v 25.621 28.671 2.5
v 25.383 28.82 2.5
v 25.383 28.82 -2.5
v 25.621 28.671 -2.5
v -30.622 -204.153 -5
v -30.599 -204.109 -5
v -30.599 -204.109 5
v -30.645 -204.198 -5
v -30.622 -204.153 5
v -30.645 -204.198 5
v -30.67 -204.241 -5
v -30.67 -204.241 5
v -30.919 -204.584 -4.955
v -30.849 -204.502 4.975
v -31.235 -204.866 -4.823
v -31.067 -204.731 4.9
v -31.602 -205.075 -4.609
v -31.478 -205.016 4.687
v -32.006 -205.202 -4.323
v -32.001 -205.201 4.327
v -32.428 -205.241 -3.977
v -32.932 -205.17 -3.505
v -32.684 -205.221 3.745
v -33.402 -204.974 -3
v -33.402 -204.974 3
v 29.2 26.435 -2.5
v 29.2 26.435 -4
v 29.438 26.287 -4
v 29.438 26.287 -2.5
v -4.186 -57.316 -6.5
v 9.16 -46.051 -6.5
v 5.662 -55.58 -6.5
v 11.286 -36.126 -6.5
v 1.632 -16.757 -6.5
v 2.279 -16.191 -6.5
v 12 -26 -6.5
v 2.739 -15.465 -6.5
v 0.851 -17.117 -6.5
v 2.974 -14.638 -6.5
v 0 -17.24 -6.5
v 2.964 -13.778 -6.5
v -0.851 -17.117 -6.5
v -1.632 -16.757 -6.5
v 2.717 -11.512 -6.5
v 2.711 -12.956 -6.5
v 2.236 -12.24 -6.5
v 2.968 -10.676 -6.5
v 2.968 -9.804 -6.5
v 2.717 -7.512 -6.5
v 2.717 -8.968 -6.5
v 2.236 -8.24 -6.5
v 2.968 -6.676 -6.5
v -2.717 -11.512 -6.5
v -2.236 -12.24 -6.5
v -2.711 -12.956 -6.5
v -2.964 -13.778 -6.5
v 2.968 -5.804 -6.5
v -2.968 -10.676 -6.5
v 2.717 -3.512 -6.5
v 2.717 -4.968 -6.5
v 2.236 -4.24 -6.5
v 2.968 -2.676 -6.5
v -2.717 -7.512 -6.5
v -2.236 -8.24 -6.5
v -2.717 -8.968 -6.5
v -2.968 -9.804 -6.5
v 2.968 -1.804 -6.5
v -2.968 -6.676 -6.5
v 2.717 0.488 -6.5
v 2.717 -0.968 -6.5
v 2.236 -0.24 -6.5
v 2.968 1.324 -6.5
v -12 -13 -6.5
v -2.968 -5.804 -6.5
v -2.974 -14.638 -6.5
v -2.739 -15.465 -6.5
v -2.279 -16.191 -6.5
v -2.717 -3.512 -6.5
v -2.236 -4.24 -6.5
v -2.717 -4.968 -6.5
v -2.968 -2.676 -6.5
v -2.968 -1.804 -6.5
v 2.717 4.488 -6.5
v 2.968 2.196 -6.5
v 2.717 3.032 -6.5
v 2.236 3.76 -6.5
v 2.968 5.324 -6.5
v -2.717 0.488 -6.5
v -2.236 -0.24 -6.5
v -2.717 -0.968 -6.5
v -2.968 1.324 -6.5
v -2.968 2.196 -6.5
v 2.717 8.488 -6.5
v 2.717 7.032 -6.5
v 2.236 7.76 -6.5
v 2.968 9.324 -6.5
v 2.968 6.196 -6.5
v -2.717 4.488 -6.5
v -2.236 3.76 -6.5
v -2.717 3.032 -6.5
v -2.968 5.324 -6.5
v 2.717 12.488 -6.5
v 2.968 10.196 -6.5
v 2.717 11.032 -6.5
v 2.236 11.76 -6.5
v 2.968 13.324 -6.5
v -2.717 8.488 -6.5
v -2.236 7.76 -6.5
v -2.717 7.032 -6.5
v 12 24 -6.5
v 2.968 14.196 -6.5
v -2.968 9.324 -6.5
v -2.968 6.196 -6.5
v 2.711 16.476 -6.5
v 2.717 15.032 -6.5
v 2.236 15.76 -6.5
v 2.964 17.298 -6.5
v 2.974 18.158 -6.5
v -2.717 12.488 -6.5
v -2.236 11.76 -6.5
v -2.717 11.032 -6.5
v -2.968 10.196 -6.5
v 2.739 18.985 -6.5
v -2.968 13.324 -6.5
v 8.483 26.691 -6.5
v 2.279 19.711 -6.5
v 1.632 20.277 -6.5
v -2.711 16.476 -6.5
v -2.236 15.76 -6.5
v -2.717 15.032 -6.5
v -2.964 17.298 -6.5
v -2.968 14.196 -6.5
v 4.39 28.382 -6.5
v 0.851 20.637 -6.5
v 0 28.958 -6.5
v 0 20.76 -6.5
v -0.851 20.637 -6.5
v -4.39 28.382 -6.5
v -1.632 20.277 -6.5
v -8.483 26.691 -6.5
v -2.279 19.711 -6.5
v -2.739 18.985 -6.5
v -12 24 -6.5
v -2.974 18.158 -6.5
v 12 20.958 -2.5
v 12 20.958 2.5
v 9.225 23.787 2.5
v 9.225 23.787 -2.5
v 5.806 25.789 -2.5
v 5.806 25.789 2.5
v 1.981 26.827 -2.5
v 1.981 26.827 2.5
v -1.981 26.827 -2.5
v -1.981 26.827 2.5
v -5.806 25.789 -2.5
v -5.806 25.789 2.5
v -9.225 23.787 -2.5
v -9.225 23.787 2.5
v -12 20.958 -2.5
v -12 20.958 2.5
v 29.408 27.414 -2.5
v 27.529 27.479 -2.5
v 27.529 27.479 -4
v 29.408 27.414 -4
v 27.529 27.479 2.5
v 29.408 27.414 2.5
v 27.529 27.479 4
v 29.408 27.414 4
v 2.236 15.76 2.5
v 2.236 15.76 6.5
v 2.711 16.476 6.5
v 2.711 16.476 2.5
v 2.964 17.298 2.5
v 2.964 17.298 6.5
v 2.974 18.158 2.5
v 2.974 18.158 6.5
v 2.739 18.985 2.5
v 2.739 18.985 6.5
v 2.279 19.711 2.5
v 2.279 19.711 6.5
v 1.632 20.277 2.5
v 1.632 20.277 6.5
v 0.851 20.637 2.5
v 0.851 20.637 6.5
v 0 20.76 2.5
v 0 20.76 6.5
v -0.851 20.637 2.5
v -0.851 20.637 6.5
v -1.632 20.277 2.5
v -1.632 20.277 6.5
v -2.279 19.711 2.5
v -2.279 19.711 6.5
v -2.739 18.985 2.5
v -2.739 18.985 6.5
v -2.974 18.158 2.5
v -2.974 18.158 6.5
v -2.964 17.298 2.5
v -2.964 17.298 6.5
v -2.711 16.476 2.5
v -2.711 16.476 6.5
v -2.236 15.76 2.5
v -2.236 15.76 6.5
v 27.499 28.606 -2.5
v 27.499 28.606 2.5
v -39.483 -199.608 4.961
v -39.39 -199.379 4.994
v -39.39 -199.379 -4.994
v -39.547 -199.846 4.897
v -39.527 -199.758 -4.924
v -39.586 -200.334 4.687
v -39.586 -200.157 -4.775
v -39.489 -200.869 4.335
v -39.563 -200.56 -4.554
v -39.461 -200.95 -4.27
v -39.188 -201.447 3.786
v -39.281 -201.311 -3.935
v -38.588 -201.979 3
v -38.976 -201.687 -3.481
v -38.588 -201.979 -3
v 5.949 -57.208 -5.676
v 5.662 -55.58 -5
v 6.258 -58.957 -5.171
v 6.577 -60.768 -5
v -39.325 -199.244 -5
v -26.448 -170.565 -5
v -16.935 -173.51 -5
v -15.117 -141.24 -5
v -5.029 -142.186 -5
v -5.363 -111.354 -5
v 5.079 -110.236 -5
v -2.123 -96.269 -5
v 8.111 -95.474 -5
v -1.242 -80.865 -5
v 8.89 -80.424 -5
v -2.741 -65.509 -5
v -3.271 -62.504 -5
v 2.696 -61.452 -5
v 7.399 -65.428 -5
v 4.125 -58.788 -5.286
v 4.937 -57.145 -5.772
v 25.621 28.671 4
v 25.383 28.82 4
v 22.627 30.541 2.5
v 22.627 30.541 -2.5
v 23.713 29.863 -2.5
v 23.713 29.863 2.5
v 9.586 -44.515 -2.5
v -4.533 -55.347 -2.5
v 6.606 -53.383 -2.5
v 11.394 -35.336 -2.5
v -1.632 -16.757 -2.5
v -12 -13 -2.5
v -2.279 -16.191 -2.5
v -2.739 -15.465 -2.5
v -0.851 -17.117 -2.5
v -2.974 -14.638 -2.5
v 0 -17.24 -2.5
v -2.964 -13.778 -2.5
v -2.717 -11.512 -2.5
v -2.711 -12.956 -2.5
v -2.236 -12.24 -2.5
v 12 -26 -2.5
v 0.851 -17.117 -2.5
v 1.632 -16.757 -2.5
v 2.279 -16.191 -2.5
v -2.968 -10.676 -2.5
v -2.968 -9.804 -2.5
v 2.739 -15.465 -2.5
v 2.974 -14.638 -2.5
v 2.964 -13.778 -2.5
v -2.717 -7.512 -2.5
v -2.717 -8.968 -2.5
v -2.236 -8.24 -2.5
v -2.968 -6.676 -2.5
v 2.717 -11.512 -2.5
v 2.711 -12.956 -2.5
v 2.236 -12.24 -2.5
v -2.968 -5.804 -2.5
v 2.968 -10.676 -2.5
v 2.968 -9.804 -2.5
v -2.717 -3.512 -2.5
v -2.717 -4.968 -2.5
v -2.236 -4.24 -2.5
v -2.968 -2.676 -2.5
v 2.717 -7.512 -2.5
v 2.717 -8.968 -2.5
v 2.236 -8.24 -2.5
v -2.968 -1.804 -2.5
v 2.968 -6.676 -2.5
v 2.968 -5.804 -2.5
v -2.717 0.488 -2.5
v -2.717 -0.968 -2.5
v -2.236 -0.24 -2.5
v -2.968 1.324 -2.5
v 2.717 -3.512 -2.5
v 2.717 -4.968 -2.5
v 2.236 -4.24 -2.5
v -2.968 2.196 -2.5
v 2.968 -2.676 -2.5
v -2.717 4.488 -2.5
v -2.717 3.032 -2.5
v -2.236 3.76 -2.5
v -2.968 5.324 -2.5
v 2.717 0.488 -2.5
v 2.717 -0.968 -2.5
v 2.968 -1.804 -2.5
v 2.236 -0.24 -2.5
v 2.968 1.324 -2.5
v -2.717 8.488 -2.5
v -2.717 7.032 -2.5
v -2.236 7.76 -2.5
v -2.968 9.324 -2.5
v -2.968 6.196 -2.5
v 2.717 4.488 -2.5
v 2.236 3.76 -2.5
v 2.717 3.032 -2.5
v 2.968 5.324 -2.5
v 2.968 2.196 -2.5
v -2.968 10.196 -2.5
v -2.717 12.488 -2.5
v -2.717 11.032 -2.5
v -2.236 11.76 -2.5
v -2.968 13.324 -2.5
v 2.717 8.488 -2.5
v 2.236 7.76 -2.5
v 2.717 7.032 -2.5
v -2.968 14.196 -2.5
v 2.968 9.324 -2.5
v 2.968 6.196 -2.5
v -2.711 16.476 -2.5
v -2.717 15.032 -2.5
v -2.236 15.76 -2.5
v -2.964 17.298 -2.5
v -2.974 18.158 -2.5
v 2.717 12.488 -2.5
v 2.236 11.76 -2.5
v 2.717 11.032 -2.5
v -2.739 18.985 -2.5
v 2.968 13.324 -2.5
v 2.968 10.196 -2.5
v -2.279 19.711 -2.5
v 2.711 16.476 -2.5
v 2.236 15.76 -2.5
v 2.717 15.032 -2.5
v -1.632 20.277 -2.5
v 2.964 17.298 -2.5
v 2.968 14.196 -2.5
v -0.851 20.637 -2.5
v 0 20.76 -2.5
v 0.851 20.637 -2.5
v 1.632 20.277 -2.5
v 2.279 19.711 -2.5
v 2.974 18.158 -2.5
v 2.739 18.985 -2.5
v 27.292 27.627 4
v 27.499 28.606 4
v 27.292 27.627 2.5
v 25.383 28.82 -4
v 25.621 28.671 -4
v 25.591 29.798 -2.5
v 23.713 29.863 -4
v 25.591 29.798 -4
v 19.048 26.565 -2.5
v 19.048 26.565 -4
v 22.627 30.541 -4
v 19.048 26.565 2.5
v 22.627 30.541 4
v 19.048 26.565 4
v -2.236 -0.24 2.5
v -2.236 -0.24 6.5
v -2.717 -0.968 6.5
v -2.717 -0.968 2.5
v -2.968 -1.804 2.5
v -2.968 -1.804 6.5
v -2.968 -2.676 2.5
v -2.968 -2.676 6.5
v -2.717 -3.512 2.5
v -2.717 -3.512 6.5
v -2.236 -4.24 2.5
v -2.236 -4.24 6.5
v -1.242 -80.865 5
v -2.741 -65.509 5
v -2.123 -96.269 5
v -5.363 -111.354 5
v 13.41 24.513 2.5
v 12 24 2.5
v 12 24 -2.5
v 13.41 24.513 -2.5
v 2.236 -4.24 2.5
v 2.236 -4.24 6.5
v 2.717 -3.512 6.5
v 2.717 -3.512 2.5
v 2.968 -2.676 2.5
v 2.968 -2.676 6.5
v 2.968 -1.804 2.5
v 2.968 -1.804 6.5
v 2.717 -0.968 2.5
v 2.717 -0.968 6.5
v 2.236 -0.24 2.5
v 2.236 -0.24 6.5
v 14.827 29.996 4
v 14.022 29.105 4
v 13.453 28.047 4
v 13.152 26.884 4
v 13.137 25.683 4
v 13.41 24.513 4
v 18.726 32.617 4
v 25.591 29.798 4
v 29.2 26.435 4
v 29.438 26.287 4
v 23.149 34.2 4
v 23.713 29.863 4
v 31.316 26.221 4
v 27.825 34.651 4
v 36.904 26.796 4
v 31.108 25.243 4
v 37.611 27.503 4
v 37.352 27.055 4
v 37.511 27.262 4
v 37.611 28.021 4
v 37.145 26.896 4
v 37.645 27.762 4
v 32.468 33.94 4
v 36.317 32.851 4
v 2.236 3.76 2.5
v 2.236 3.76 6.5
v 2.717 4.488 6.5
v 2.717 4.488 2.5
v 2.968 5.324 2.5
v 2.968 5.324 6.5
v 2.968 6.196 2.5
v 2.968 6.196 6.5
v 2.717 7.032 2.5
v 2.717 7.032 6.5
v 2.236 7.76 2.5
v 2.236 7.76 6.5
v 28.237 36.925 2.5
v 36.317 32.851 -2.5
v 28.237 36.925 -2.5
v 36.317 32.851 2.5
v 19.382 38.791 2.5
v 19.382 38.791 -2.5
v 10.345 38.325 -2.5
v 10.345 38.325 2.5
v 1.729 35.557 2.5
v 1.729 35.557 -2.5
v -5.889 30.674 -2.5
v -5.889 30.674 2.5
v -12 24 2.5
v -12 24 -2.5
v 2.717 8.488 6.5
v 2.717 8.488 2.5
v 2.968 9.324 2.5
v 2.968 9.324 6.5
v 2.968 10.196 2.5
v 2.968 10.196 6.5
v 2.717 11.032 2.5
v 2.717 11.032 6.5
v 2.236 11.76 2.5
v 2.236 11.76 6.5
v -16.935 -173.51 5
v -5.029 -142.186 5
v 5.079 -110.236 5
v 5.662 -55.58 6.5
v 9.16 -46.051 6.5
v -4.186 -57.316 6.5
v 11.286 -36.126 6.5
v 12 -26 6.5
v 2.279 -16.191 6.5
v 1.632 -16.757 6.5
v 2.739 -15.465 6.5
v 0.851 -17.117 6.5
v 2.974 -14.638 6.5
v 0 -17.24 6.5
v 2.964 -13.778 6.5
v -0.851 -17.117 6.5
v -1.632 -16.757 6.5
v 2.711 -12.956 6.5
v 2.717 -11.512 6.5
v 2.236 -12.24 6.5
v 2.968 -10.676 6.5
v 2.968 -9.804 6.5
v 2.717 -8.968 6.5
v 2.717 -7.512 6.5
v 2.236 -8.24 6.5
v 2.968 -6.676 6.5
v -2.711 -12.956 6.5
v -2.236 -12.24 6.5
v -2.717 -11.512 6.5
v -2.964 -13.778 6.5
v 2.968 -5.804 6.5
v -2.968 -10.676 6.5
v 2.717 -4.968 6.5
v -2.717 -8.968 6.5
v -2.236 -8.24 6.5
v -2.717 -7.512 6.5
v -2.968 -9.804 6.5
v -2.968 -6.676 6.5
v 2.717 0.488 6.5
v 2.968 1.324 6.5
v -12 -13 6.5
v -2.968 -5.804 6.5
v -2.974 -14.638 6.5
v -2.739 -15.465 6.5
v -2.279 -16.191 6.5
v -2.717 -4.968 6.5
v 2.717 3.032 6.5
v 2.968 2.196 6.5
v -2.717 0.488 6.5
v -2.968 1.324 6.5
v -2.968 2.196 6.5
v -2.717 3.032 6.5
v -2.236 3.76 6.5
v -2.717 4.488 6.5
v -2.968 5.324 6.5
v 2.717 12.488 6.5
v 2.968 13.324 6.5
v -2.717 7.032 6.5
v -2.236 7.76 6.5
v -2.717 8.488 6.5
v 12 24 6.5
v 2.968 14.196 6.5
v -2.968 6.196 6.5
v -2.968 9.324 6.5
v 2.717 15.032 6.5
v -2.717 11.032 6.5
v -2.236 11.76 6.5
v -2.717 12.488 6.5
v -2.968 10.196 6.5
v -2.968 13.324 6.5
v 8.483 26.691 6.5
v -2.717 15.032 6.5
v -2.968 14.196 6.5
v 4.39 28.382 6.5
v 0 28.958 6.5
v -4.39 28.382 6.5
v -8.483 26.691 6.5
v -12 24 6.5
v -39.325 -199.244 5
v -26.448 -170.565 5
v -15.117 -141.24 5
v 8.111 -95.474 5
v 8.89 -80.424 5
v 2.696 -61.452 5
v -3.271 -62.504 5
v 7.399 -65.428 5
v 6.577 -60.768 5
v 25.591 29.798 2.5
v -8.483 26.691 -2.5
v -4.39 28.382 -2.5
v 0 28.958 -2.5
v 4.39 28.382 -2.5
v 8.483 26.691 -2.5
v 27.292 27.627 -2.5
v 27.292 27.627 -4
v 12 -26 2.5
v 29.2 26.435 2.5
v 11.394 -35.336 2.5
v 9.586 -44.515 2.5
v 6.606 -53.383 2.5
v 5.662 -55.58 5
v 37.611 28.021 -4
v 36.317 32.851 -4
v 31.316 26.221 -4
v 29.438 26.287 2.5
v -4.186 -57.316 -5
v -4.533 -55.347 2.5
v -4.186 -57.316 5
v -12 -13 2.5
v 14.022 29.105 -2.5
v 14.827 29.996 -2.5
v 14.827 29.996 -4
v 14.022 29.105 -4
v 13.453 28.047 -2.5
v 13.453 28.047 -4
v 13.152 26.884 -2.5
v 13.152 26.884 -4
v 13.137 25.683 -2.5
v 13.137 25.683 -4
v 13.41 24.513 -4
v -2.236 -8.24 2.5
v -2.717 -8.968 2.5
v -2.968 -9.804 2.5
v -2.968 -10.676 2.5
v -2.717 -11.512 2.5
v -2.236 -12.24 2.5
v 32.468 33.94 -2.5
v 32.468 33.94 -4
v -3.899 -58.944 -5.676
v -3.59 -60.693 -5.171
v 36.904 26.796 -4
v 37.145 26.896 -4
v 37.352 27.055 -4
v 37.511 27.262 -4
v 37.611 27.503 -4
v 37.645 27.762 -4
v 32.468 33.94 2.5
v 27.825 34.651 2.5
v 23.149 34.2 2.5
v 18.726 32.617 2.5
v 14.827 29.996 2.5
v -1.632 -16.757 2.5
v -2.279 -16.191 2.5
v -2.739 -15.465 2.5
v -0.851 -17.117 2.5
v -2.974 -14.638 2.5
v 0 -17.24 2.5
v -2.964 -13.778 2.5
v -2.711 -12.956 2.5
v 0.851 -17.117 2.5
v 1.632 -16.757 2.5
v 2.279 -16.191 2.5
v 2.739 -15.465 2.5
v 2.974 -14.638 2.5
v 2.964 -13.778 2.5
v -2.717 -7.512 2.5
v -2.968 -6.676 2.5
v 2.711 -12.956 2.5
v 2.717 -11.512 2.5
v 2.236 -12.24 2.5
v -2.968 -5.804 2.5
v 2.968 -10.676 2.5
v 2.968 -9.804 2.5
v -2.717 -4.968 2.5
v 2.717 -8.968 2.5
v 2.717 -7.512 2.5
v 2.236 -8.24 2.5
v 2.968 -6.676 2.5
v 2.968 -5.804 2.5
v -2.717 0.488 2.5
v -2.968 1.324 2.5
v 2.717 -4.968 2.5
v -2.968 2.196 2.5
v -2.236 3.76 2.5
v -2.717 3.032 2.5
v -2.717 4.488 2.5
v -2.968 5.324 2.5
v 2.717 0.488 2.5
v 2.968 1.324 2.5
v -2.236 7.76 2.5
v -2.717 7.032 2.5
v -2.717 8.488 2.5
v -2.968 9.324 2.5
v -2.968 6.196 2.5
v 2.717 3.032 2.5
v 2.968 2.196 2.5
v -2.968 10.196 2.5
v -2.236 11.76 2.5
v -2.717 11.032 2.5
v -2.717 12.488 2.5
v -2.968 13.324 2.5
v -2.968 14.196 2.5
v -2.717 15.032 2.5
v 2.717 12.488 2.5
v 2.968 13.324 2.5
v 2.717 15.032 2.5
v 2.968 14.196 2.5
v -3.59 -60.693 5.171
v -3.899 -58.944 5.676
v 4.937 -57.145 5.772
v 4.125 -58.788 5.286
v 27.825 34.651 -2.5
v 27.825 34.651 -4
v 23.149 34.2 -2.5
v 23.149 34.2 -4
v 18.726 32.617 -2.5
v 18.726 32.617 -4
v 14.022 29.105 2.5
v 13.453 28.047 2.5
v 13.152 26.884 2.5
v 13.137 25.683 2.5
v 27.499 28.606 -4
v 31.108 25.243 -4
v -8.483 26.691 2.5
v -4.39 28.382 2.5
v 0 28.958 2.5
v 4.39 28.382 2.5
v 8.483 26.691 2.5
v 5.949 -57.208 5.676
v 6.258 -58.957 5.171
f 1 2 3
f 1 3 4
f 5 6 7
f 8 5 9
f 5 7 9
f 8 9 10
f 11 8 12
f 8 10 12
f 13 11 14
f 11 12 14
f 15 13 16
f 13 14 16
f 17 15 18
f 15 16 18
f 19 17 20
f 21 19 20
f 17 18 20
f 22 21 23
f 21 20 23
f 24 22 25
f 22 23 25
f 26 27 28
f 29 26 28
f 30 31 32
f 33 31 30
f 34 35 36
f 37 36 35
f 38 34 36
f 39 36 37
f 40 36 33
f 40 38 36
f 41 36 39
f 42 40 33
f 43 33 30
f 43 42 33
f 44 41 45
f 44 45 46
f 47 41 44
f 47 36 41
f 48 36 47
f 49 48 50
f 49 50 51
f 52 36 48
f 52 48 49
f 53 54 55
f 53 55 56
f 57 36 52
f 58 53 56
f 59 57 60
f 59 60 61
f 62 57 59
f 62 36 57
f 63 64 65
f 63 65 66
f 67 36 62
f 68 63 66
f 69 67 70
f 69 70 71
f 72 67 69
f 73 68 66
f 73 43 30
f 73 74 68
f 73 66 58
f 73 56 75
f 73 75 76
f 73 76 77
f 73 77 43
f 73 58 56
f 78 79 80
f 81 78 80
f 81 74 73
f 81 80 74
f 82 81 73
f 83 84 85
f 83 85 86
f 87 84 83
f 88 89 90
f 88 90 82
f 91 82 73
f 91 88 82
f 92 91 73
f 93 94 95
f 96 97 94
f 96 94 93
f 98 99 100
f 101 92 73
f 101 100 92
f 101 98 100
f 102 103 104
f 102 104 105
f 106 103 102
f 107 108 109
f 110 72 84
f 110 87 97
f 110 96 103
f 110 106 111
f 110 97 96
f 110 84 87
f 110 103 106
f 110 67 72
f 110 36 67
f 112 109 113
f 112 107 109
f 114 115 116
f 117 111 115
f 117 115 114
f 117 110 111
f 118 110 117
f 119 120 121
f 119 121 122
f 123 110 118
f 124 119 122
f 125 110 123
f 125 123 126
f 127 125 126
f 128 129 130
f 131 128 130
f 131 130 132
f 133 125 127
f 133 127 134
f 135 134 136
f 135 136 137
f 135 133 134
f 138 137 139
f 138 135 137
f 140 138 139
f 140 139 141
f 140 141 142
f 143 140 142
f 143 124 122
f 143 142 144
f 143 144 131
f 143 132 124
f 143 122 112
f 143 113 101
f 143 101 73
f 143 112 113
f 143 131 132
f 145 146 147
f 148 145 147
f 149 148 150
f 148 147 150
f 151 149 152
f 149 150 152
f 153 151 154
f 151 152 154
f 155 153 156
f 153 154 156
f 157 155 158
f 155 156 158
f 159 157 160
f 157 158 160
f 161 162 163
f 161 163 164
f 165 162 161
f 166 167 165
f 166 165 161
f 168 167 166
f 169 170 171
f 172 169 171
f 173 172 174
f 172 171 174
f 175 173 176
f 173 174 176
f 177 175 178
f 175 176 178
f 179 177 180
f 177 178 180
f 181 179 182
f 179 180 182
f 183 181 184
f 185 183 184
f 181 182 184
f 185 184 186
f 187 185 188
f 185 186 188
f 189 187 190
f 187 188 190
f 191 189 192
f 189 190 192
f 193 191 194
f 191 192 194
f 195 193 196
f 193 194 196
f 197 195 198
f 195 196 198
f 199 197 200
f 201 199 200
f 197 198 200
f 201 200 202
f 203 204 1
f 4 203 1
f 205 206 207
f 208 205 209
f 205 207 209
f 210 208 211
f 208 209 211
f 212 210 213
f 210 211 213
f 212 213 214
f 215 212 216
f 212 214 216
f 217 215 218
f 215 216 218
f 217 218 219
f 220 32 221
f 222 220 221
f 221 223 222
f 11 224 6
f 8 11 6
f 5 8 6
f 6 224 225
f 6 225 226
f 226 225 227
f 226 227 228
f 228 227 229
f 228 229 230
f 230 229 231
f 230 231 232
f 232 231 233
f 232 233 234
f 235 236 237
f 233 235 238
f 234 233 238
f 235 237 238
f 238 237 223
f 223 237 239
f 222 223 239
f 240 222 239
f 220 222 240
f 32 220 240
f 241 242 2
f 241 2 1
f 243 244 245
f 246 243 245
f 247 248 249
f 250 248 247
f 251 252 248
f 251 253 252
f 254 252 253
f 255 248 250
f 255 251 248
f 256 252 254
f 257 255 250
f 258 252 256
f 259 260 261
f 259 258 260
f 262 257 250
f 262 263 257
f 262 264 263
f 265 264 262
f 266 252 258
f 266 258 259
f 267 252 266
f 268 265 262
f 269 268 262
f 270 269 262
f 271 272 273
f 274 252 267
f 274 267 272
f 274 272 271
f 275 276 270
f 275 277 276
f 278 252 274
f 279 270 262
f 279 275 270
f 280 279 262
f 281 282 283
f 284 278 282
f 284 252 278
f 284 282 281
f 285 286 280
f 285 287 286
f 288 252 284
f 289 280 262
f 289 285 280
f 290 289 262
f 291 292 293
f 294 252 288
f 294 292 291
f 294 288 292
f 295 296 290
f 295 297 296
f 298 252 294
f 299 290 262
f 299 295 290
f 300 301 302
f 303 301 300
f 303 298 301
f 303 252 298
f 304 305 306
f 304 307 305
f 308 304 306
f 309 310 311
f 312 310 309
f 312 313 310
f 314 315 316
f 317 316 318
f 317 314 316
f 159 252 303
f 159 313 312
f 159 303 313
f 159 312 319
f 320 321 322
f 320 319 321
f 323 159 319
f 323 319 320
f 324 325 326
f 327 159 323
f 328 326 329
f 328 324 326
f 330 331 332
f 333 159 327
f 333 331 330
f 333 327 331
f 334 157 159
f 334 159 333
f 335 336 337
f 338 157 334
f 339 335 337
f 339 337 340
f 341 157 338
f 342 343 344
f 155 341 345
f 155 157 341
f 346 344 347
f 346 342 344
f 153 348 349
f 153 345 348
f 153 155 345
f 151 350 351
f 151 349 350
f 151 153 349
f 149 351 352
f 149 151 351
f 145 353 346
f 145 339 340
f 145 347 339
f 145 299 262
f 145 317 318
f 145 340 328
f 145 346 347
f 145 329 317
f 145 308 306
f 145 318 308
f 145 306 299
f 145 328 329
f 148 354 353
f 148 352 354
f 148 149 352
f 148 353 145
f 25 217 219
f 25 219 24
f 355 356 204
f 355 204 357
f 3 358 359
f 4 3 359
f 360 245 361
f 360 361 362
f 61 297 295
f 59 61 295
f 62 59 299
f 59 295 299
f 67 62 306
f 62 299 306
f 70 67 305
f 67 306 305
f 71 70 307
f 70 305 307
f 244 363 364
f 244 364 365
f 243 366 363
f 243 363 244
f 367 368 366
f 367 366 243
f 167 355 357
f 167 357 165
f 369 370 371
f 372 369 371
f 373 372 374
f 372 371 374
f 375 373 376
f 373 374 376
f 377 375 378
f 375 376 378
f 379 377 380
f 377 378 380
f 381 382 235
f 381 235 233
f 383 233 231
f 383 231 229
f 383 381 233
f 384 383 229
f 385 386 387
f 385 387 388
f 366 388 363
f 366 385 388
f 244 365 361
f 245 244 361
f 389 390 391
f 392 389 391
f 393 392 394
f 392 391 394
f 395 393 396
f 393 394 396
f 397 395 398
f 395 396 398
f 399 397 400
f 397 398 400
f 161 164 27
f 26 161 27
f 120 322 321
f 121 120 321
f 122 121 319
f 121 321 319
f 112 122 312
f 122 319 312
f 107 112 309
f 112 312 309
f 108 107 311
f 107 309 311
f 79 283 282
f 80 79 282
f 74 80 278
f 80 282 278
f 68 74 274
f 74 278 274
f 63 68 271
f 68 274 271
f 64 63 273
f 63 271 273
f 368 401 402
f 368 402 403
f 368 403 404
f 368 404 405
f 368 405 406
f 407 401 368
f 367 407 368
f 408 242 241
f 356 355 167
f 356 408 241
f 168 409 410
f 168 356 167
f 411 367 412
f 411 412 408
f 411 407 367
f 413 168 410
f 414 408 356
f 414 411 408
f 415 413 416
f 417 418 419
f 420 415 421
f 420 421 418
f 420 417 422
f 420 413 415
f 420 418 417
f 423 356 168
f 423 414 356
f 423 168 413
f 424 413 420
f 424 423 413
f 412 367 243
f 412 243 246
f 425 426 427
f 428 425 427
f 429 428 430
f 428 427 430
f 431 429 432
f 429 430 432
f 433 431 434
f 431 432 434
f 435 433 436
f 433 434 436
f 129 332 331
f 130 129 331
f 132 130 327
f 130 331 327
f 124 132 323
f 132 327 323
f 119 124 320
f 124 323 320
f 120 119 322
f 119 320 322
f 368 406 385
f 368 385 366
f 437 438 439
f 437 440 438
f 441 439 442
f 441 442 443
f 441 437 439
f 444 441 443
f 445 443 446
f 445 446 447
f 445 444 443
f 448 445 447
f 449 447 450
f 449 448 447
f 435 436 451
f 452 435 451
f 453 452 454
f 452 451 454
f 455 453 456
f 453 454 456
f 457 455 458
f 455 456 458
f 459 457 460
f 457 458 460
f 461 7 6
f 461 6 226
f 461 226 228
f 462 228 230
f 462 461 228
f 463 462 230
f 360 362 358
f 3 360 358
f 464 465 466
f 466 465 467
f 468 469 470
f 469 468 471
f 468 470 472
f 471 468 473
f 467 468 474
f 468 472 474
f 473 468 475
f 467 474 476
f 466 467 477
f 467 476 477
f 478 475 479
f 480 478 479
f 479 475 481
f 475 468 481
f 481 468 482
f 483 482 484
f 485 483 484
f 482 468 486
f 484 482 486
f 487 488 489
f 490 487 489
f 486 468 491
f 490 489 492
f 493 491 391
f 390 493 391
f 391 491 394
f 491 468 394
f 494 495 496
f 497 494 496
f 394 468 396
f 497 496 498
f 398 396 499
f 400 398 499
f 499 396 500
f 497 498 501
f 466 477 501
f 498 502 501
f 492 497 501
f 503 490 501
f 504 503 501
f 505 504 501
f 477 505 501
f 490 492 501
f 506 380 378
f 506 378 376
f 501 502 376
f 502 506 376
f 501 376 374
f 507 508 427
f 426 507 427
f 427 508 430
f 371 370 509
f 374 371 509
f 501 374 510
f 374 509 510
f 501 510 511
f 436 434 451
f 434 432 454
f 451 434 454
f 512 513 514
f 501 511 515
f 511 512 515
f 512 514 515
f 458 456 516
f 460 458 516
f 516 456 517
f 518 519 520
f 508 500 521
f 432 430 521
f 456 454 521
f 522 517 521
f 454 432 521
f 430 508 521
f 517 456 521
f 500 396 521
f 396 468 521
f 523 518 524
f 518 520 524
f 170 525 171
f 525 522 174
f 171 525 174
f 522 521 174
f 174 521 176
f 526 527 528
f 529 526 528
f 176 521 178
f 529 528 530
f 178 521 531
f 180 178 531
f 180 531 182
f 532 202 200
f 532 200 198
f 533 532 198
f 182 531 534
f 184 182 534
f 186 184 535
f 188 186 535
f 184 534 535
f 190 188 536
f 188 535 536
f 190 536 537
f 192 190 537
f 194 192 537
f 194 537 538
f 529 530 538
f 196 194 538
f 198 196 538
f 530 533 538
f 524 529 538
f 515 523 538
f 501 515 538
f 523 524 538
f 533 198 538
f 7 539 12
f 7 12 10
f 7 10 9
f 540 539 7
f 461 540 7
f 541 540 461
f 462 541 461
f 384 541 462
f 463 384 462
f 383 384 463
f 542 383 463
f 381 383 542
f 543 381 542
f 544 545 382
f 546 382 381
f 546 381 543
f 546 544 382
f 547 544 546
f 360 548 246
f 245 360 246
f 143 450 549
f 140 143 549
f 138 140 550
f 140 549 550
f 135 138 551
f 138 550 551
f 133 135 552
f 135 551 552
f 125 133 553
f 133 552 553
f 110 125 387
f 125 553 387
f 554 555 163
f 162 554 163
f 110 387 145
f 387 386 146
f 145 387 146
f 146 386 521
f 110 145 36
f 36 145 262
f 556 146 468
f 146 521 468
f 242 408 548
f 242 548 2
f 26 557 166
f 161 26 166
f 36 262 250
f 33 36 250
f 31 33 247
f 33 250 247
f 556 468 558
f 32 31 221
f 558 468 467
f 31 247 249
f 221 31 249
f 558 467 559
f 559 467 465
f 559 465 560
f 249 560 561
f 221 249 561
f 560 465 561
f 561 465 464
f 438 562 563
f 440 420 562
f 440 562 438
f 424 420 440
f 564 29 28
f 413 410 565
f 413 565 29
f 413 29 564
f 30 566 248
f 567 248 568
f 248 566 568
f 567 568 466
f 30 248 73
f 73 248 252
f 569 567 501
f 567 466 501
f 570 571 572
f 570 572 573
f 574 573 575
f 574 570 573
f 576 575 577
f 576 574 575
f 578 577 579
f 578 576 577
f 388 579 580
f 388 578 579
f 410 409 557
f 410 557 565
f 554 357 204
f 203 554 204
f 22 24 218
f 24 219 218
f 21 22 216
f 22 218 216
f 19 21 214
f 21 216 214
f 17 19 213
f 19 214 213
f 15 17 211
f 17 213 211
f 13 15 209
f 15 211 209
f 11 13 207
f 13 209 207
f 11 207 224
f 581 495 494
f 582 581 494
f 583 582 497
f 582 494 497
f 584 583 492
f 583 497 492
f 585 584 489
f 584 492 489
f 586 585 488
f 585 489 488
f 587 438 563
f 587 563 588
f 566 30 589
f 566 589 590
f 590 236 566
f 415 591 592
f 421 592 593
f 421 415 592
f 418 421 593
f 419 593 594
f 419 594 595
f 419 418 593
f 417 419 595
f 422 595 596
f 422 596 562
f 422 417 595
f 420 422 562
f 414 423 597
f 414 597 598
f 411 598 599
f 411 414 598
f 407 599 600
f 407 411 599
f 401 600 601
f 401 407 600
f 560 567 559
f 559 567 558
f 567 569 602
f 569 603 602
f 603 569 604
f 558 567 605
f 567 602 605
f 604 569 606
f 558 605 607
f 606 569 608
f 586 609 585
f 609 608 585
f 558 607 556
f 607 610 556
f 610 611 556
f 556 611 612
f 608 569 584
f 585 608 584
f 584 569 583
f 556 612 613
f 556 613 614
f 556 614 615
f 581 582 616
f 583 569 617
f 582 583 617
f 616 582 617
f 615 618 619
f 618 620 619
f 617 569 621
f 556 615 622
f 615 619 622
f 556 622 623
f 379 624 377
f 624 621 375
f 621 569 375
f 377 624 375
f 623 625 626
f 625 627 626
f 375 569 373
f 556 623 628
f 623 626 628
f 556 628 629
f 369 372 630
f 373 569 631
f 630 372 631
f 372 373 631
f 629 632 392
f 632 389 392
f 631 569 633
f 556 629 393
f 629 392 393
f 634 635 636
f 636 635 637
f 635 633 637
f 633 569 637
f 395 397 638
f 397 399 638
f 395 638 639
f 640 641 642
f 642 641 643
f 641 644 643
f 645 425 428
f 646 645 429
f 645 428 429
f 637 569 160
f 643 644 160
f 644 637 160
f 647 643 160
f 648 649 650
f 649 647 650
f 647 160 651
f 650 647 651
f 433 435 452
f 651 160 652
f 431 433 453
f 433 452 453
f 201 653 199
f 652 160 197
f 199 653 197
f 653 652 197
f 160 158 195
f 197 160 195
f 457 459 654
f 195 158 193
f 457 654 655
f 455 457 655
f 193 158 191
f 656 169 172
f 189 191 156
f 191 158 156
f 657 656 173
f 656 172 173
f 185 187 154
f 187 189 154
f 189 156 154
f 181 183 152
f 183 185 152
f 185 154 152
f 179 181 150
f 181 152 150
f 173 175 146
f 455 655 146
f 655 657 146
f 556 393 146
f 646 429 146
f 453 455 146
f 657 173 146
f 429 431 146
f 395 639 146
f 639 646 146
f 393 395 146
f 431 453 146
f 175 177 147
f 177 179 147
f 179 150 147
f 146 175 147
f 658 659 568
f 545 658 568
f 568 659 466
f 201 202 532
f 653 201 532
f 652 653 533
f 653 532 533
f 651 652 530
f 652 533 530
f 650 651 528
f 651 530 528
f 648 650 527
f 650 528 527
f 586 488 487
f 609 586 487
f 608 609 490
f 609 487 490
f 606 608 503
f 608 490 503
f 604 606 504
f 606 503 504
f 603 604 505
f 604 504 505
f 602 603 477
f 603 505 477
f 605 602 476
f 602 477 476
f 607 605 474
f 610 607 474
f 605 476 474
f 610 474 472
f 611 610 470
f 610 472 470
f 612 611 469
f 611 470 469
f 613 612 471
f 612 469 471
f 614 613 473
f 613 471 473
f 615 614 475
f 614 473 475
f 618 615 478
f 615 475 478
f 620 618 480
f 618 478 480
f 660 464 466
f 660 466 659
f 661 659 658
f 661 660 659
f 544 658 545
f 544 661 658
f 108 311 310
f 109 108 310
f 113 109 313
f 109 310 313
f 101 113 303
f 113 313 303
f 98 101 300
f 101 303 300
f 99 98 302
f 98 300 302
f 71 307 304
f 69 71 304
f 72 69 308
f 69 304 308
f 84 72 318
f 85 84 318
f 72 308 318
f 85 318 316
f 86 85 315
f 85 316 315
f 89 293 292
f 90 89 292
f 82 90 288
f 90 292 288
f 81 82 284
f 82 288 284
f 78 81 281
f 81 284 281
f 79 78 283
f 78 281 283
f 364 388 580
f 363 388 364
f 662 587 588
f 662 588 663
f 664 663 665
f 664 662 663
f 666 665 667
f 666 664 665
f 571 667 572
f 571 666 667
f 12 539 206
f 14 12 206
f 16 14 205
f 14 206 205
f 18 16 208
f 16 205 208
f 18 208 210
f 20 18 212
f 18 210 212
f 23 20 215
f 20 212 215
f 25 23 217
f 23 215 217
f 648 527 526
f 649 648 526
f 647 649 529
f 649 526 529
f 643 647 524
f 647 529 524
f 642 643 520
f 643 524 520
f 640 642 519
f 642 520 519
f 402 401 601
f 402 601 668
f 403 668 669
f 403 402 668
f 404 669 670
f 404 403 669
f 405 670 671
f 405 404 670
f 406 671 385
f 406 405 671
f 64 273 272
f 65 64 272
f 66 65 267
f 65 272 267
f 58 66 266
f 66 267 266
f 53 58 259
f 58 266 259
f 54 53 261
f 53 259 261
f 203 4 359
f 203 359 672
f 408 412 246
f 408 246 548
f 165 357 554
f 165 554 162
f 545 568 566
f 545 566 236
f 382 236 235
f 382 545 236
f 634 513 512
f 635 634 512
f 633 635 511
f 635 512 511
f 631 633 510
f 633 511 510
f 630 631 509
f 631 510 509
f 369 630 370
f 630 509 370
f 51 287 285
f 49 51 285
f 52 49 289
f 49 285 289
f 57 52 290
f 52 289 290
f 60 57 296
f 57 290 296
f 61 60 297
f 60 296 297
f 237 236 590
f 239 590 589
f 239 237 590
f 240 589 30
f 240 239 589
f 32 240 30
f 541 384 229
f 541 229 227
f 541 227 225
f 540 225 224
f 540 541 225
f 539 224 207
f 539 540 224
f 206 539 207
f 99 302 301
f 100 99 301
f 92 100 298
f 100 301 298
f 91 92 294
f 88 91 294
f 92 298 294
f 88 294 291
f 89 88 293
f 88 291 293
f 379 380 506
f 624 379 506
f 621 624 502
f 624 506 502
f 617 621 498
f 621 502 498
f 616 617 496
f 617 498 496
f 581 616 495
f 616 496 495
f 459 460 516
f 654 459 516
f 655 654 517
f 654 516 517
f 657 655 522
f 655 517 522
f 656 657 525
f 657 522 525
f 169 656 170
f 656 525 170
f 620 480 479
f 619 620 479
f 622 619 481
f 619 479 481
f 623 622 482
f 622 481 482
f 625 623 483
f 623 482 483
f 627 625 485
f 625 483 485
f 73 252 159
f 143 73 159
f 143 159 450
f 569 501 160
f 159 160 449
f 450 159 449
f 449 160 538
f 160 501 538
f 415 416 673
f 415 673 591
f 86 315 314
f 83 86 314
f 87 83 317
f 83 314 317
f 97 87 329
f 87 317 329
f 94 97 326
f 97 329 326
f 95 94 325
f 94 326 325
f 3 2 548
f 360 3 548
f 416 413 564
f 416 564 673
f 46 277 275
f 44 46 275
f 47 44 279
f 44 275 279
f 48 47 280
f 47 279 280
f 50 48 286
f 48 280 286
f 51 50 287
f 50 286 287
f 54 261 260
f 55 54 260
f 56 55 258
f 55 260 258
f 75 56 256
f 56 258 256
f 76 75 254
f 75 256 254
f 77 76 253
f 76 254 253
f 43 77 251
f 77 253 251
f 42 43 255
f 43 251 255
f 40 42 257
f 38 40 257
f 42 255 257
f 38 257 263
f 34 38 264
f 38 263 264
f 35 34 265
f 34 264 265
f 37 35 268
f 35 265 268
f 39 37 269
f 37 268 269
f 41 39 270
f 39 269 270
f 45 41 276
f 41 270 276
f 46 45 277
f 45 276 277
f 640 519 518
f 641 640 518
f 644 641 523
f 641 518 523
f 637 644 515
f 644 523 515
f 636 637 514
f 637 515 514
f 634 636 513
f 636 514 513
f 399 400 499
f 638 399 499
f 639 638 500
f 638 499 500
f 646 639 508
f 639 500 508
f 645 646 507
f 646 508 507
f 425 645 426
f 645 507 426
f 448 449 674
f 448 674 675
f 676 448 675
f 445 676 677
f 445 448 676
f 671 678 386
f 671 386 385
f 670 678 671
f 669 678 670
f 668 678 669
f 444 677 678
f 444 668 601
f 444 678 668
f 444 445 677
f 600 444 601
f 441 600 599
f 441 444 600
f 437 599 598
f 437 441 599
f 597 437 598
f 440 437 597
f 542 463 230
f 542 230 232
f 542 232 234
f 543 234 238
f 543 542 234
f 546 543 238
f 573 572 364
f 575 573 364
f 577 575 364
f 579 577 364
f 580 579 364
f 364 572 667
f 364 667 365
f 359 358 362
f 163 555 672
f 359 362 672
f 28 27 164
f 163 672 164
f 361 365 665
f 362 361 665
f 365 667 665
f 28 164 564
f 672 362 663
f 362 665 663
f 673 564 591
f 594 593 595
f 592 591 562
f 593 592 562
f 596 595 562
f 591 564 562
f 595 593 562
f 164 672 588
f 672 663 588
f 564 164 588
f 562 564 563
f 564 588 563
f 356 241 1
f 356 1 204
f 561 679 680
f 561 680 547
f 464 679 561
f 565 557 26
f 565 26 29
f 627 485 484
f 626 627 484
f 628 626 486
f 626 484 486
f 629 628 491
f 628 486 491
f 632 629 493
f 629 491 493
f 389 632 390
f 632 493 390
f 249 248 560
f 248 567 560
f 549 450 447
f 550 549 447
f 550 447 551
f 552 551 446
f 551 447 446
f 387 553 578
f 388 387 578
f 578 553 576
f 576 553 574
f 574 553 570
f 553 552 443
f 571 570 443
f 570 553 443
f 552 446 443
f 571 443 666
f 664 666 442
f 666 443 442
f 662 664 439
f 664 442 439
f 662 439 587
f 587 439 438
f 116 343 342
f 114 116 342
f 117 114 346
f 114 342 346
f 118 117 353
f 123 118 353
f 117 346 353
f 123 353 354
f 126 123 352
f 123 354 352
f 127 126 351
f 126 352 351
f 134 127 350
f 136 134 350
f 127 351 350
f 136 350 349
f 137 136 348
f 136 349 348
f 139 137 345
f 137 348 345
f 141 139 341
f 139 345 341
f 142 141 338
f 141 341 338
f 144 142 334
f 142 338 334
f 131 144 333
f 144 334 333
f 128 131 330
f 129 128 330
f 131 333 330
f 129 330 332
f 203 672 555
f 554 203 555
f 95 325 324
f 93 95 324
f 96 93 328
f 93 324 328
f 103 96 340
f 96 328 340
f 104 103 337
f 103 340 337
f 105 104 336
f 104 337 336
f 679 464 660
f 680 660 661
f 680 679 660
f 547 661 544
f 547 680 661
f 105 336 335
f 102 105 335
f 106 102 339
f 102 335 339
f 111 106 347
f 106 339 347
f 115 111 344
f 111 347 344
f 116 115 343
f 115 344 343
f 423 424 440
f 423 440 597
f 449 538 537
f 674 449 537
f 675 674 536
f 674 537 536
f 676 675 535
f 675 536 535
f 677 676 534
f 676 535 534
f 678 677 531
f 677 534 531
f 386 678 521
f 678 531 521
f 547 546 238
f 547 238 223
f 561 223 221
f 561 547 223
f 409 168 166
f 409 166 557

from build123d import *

# Parameters (mm, degrees)
BOSS_EXTRUDE1_DEPTH = 6.5
BOSS_EXTRUDE2_DEPTH = 5
BOSS_EXTRUDE3_DEPTH = 2.5
CUT_EXTRUDE1_DEPTH  = 211.126980415
LPATTERN1_COUNT     = 4
LPATTERN1_PITCH     = 2.25
BOSS_EXTRUDE4_DEPTH = 4
FILLET1_R           = 10
FILLET2_R           = 2
CUT_EXTRUDE4_DEPTH  = 2.5


with BuildPart() as part:
    # Sketch1 → Boss-Extrude1 (new, symmetric)
    with BuildSketch(Plane.XY):
        with BuildLine():
            Line((12, 24), (12, -26))
            ThreePointArc((12, -26), (10.397782984, -41.125604698), (5.662245525, -55.579867109))
            Line((5.662245525, -55.579867109), (-4.185832005, -57.316348886))
            Line((-4.185832005, -57.316348886), (-12, -13))
            Line((-12, -13), (-12, 24))
            ThreePointArc((-12, 24), (0, 28.958405421), (12, 24))
        make_face()
        with BuildLine():
            ThreePointArc((2.236067977, 15.76), (0, 20.76), (-2.236067977, 15.76))
            ThreePointArc((-2.236067977, 15.76), (-3, 13.76), (-2.236067977, 11.76))
            ThreePointArc((-2.236067977, 11.76), (-3, 9.76), (-2.236067977, 7.76))
            ThreePointArc((-2.236067977, 7.76), (-3, 5.76), (-2.236067977, 3.76))
            ThreePointArc((-2.236067977, 3.76), (-3, 1.76), (-2.236067977, -0.24))
            ThreePointArc((-2.236067977, -0.24), (-3, -2.24), (-2.236067977, -4.24))
            ThreePointArc((-2.236067977, -4.24), (-3, -6.24), (-2.236067977, -8.24))
            ThreePointArc((-2.236067977, -8.24), (-3, -10.24), (-2.236067977, -12.24))
            ThreePointArc((-2.236067977, -12.24), (0, -17.24), (2.236067978, -12.24))
            ThreePointArc((2.236067978, -12.24), (3, -10.24), (2.236067978, -8.24))
            ThreePointArc((2.236067978, -8.24), (3, -6.24), (2.236067978, -4.24))
            ThreePointArc((2.236067978, -4.24), (3, -2.24), (2.236067977, -0.24))
            ThreePointArc((2.236067977, -0.24), (3, 1.76), (2.236067977, 3.76))
            ThreePointArc((2.236067977, 3.76), (3, 5.76), (2.236067977, 7.76))
            ThreePointArc((2.236067977, 7.76), (3, 9.76), (2.236067977, 11.76))
            ThreePointArc((2.236067977, 11.76), (3, 13.76), (2.236067977, 15.76))
        make_face(mode=Mode.SUBTRACT)
    extrude(amount=BOSS_EXTRUDE1_DEPTH, both=True)

    # Sketch2 → Boss-Extrude2 (add, symmetric)
    with BuildSketch(Plane.XY):
        with BuildLine():
            Line((-4.185832005, -57.316348886), (-2.741272698, -65.50885182))
            ThreePointArc((-2.741272698, -65.50885182), (-1.385209123, -88.583801204), (-5.363349951, -111.353662711))
            ThreePointArc((-5.363349951, -111.353662711), (-20.948984173, -156.913011465), (-40.197837741, -201.049706962))
            Line((-40.197837741, -201.049706962), (-31.537583703, -206.049706962))
            ThreePointArc((-31.537583703, -206.049706962), (-11.143355809, -158.940001486), (5.078639021, -110.235835698))
            ThreePointArc((5.078639021, -110.235835698), (8.784169957, -87.963691821), (7.398727302, -65.427944639))
            Line((7.398727302, -65.427944639), (5.662245525, -55.579867109))
            Line((5.662245525, -55.579867109), (-4.185832005, -57.316348886))
        make_face()
    extrude(amount=BOSS_EXTRUDE2_DEPTH, both=True)

    # Sketch3 → Boss-Extrude3 (add, symmetric)
    with BuildSketch(Plane.XY):
        with BuildLine():
            Line((12, 24), (19.047694656, 26.565151075))
            Line((19.047694656, 26.565151075), (22.627047638, 30.541422221))
            Line((22.627047638, 30.541422221), (31.108189275, 25.243287027))
            Line((31.108189275, 25.243287027), (36.903744232, 26.796201298))
            ThreePointArc((36.903744232, 26.796201298), (37.510950591, 27.262127124), (37.610851014, 28.020946169))
            Line((37.610851014, 28.020946169), (36.316755788, 32.850575301))
            ThreePointArc((36.316755788, 32.850575301), (10.344991875, 38.324862138), (-12, 24))
            ThreePointArc((-12, 24), (0, 28.958405421), (12, 24))
        make_face()
    extrude(amount=BOSS_EXTRUDE3_DEPTH, both=True)

    # Sketch4 → Cut-Extrude1 (cut, through all)
    with BuildSketch(Plane.XY.offset(2.5)):
        Polygon((31.108189275, 25.243287027), (31.315979001, 26.221460544), (29.437730467, 26.28681595), align=None)
    cut_extrude1 = extrude(amount=-CUT_EXTRUDE1_DEPTH, mode=Mode.SUBTRACT)

    # LPattern1: Cut-Extrude1 ×4
    with Locations(*[Vector(-0.8481141636867628, 0.5298135194140507, 0) * (i * LPATTERN1_PITCH) for i in range(1, LPATTERN1_COUNT)]):
        add(cut_extrude1, mode=Mode.SUBTRACT)

    # Sketch5 → Boss-Extrude4 (add, symmetric)
    with BuildSketch(Plane.XY):
        with BuildLine():
            Line((13.409538931, 24.513030215), (19.047694656, 26.565151075))
            Line((19.047694656, 26.565151075), (22.627047638, 30.541422221))
            Line((22.627047638, 30.541422221), (23.712959862, 29.863057207))
            Line((23.712959862, 29.863057207), (25.591208397, 29.7977018))
            Line((25.591208397, 29.7977018), (25.38341867, 28.819528283))
            Line((25.38341867, 28.819528283), (25.62121673, 28.670976788))
            Line((25.62121673, 28.670976788), (27.499465265, 28.605621382))
            Line((27.499465265, 28.605621382), (27.291675538, 27.627447865))
            Line((27.291675538, 27.627447865), (27.529473599, 27.478896369))
            Line((27.529473599, 27.478896369), (29.407722133, 27.413540963))
            Line((29.407722133, 27.413540963), (29.199932406, 26.435367446))
            Line((29.199932406, 26.435367446), (29.437730467, 26.28681595))
            Line((29.437730467, 26.28681595), (31.315979001, 26.221460544))
            Line((31.315979001, 26.221460544), (31.108189275, 25.243287027))
            Line((31.108189275, 25.243287027), (36.903744232, 26.796201298))
            ThreePointArc((36.903744232, 26.796201298), (37.510950591, 27.262127124), (37.610851014, 28.020946169))
            Line((37.610851014, 28.020946169), (36.316755788, 32.850575301))
            Line((36.316755788, 32.850575301), (32.467935935, 33.939880464))
            ThreePointArc((32.467935935, 33.939880464), (23.148661732, 34.20032571), (14.827382616, 29.996396921))
            ThreePointArc((14.827382616, 29.996396921), (13.267210046, 27.474822952), (13.409538931, 24.513030215))
        make_face()
    extrude(amount=BOSS_EXTRUDE4_DEPTH, both=True)

    # Fillet1
    # the kernel refuses this fillet: 10 mm, written as the material it adds along each edge
    with BuildSketch(Plane(origin=(5.662245525, -55.579867109, 5), x_dir=(0.17364817766693216, -0.9848077530122078, 0), z_dir=(-0.9848077530122078, -0.1736481776669322, 0))) as fillet1_piece_1_section:
        with BuildLine():
            CenterArc((5.267826876, 10), FILLET1_R, 238.211669383, 31.788330617)
            Line((0, 1.5), (-0.105356538, 1.33))
            ThreePointArc((-0.105356538, 1.33), (-0.2, 0.75), (-0.2, 0))
            Line((-0.2, 0), (0, -0.2))
            Line((0, -0.2), (5.267826876, -0.2))
            Line((5.267826876, -0.2), (5.267826876, 0))
        make_face()
    fillet1_piece_1 = extrude(amount=10, mode=Mode.PRIVATE)
    fillet1_piece_1 = fillet1_piece_1 - Plane(origin=(-60.197153865, -26, 5.108748651), x_dir=(1, 0, 0), z_dir=(0, 0, 1)) * Cylinder(72.197153865, 42, mode=Mode.PRIVATE)
    add(fillet1_piece_1)
    with BuildSketch(Plane(origin=(18.631737399, -53.292995765, 5), x_dir=(0.1736481776669322, -0.9848077530122078, 0), z_dir=(-0.9848077530122078, -0.1736481776669322, 0))) as fillet1_piece_2_section:
        with BuildLine():
            CenterArc((5.267826876, 10), FILLET1_R, 238.211669383, 31.788330617)
            Line((0, 1.5), (-0.105356538, 1.33))
            ThreePointArc((-0.105356538, 1.33), (-0.2, 0.75), (-0.2, 0))
            Line((-0.2, 0), (0, -0.2))
            Line((0, -0.2), (5.267826876, -0.2))
            Line((5.267826876, -0.2), (5.267826876, 0))
        make_face()
    fillet1_piece_2 = extrude(amount=23.169567191, mode=Mode.PRIVATE)
    fillet1_piece_2 = split(fillet1_piece_2, bisect_by=Plane(origin=(5.639763501, -55.452365217, 5.544024215), z_dir=(0.9848077530122079, 0.17364817766693152, 0)), keep=Keep.TOP, mode=Mode.PRIVATE)
    fillet1_piece_2 = fillet1_piece_2 & Plane(origin=(-60.197153865, -26, 5.544024215), x_dir=(1, 0, 0), z_dir=(0, 0, 1)) * Cylinder(72.197153865, 68, mode=Mode.PRIVATE)
    add(fillet1_piece_2)
    with BuildSketch(Plane(origin=(5.662245525, -55.579867109, 5), x_dir=(0.17364817766693216, -0.9848077530122078, 0), z_dir=(-0.9848077530122078, -0.1736481776669322, 0))) as fillet1_piece_3_section:
        with BuildLine():
            CenterArc((5.267826876, 10), FILLET1_R, 238.211669383, 31.788330617)
            Line((0, 1.5), (-0.105356538, 1.33))
            ThreePointArc((-0.105356538, 1.33), (-0.2, 0.75), (-0.2, 0))
            Line((-0.2, 0), (0, -0.2))
            Line((0, -0.2), (5.267826876, -0.2))
            Line((5.267826876, -0.2), (5.267826876, 0))
        make_face()
    fillet1_piece_3 = extrude(amount=10, mode=Mode.PRIVATE)
    fillet1_piece_3 = fillet1_piece_3 & Plane(origin=(-60.197153865, -26, 5.331257978), x_dir=(1, 0, 0), z_dir=(0, 0, 1)) * Cylinder(72.197153865, 42, mode=Mode.PRIVATE)
    add(fillet1_piece_3)
    with BuildSketch(Plane(origin=(5.662245525, -55.579867109, -5), x_dir=(0, 0, -1), z_dir=(-0.9848077530122078, -0.1736481776669322, 0))) as fillet1_piece_4_section:
        with BuildLine():
            CenterArc((10, 5.267826876), FILLET1_R, 180, 31.788330617)
            Line((0, 5.267826876), (-0.2, 5.267826876))
            Line((-0.2, 5.267826876), (-0.2, 0))
            Line((-0.2, 0), (0, -0.2))
            ThreePointArc((0, -0.2), (0.75, -0.2), (1.33, -0.105356538))
            Line((1.33, -0.105356538), (1.5, 0))
        make_face()
    fillet1_piece_4 = extrude(amount=10, mode=Mode.PRIVATE)
    fillet1_piece_4 = fillet1_piece_4 - Plane(origin=(-60.197153865, -26, -5.108748651), x_dir=(1, 0, 0), z_dir=(0, 0, 1)) * Cylinder(72.197153865, 42, mode=Mode.PRIVATE)
    add(fillet1_piece_4)
    with BuildSketch(Plane(origin=(5.662245525, -55.579867109, -5), x_dir=(0, 0, -1), z_dir=(-0.9848077530122078, -0.1736481776669322, 0))) as fillet1_piece_5_section:
        with BuildLine():
            CenterArc((10, 5.267826876), FILLET1_R, 180, 31.788330617)
            Line((0, 5.267826876), (-0.2, 5.267826876))
            Line((-0.2, 5.267826876), (-0.2, 0))
            Line((-0.2, 0), (0, -0.2))
            ThreePointArc((0, -0.2), (0.75, -0.2), (1.33, -0.105356538))
            Line((1.33, -0.105356538), (1.5, 0))
        make_face()
    fillet1_piece_5 = extrude(amount=10, mode=Mode.PRIVATE)
    fillet1_piece_5 = fillet1_piece_5 & Plane(origin=(-60.197153865, -26, -5.331257978), x_dir=(1, 0, 0), z_dir=(0, 0, 1)) * Cylinder(72.197153865, 42, mode=Mode.PRIVATE)
    add(fillet1_piece_5)
    with BuildSketch(Plane(origin=(18.631737399, -53.292995765, -5), x_dir=(0, 0, -1), z_dir=(-0.9848077530122078, -0.1736481776669322, 0))) as fillet1_piece_6_section:
        with BuildLine():
            CenterArc((10, 5.267826876), FILLET1_R, 180, 31.788330617)
            Line((0, 5.267826876), (-0.2, 5.267826876))
            Line((-0.2, 5.267826876), (-0.2, 0))
            Line((-0.2, 0), (0, -0.2))
            ThreePointArc((0, -0.2), (0.75, -0.2), (1.33, -0.105356538))
            Line((1.33, -0.105356538), (1.5, 0))
        make_face()
    fillet1_piece_6 = extrude(amount=23.169567191, mode=Mode.PRIVATE)
    fillet1_piece_6 = fillet1_piece_6 & Plane(origin=(-60.197153865, -26, -5.544024216), x_dir=(1, 0, 0), z_dir=(0, 0, 1)) * Cylinder(72.197153865, 68, mode=Mode.PRIVATE)
    fillet1_piece_6 = split(fillet1_piece_6, bisect_by=Plane(origin=(5.639763501, -55.452365217, -5.544024216), z_dir=(0.9848077530122079, 0.17364817766693152, 0)), keep=Keep.TOP, mode=Mode.PRIVATE)
    add(fillet1_piece_6)

    # Fillet2
    # the kernel refuses this fillet: 2 mm, written as the material it takes off along each edge
    with BuildSketch(Plane(origin=(-44.52796476, -198.549706962, -5), x_dir=(0.5000000000000003, 0.8660254037844385, 0), z_dir=(0.8660254037844386, -0.5000000000000003, 0)), Plane(origin=(-44.52796476, -198.549706962, 5), x_dir=(0, 0, -1), z_dir=(0.8660254037844386, -0.5000000000000003, 0))) as fillet2_piece_1:
        with BuildLine():
            CenterArc((FILLET2_R, FILLET2_R), FILLET2_R, 180, 90)
            Line((0, FILLET2_R), (0, 0))
            Line((0, 0), (FILLET2_R, 0))
        make_face()
    extrude(amount=20, mode=Mode.SUBTRACT)
    with BuildSketch(Plane(origin=(-40.197837741, -201.049706962, -9.647216237), x_dir=(0.8660254037844397, -0.4999999999999982, 0), z_dir=(0, 0, 1))) as fillet2_piece_2:
        with BuildLine():
            CenterArc((1.858886495, 2), FILLET2_R, 184.278600347, 85.721399653)
            ThreePointArc((-0.135539641, 1.850787443), (-0.067042153, 0.925447011), (0, 0))
            Line((0, 0), (1.858886495, 0))
        make_face()
    extrude(amount=19.294432475, mode=Mode.SUBTRACT)
    with BuildSketch(Plane(origin=(-31.537583703, -206.049706962, 10.39006535), x_dir=(-0.8660254037844383, 0.5000000000000006, 0), z_dir=(0, 0, -1))) as fillet2_piece_3:
        with BuildLine():
            CenterArc((2.152368756, 2), FILLET2_R, 175.692238748, 94.307761252)
            ThreePointArc((0.158018821, 2.150227608), (0.078027217, 1.075185985), (0, 0))
            Line((0, 0), (2.152368756, 0))
        make_face()
    extrude(amount=20.780130699, mode=Mode.SUBTRACT)

    # Sketch10 → Cut-Extrude4 (cut, symmetric)
    with BuildSketch(Plane.XY):
        with BuildLine():
            Line((-4.53312836, -55.34673338), (6.605682372, -53.382660514))
            ThreePointArc((6.605682372, -53.382660514), (10.638584547, -39.954468456), (12, -26))
            Line((12, -26), (12, 20.958405421))
            ThreePointArc((12, 20.958405421), (0, 26.958405421), (-12, 20.958405421))
            Line((-12, 20.958405421), (-12, -13))
            Line((-12, -13), (-4.53312836, -55.34673338))
        make_face()
    extrude(amount=CUT_EXTRUDE4_DEPTH, both=True, mode=Mode.SUBTRACT)


solid = part.part
